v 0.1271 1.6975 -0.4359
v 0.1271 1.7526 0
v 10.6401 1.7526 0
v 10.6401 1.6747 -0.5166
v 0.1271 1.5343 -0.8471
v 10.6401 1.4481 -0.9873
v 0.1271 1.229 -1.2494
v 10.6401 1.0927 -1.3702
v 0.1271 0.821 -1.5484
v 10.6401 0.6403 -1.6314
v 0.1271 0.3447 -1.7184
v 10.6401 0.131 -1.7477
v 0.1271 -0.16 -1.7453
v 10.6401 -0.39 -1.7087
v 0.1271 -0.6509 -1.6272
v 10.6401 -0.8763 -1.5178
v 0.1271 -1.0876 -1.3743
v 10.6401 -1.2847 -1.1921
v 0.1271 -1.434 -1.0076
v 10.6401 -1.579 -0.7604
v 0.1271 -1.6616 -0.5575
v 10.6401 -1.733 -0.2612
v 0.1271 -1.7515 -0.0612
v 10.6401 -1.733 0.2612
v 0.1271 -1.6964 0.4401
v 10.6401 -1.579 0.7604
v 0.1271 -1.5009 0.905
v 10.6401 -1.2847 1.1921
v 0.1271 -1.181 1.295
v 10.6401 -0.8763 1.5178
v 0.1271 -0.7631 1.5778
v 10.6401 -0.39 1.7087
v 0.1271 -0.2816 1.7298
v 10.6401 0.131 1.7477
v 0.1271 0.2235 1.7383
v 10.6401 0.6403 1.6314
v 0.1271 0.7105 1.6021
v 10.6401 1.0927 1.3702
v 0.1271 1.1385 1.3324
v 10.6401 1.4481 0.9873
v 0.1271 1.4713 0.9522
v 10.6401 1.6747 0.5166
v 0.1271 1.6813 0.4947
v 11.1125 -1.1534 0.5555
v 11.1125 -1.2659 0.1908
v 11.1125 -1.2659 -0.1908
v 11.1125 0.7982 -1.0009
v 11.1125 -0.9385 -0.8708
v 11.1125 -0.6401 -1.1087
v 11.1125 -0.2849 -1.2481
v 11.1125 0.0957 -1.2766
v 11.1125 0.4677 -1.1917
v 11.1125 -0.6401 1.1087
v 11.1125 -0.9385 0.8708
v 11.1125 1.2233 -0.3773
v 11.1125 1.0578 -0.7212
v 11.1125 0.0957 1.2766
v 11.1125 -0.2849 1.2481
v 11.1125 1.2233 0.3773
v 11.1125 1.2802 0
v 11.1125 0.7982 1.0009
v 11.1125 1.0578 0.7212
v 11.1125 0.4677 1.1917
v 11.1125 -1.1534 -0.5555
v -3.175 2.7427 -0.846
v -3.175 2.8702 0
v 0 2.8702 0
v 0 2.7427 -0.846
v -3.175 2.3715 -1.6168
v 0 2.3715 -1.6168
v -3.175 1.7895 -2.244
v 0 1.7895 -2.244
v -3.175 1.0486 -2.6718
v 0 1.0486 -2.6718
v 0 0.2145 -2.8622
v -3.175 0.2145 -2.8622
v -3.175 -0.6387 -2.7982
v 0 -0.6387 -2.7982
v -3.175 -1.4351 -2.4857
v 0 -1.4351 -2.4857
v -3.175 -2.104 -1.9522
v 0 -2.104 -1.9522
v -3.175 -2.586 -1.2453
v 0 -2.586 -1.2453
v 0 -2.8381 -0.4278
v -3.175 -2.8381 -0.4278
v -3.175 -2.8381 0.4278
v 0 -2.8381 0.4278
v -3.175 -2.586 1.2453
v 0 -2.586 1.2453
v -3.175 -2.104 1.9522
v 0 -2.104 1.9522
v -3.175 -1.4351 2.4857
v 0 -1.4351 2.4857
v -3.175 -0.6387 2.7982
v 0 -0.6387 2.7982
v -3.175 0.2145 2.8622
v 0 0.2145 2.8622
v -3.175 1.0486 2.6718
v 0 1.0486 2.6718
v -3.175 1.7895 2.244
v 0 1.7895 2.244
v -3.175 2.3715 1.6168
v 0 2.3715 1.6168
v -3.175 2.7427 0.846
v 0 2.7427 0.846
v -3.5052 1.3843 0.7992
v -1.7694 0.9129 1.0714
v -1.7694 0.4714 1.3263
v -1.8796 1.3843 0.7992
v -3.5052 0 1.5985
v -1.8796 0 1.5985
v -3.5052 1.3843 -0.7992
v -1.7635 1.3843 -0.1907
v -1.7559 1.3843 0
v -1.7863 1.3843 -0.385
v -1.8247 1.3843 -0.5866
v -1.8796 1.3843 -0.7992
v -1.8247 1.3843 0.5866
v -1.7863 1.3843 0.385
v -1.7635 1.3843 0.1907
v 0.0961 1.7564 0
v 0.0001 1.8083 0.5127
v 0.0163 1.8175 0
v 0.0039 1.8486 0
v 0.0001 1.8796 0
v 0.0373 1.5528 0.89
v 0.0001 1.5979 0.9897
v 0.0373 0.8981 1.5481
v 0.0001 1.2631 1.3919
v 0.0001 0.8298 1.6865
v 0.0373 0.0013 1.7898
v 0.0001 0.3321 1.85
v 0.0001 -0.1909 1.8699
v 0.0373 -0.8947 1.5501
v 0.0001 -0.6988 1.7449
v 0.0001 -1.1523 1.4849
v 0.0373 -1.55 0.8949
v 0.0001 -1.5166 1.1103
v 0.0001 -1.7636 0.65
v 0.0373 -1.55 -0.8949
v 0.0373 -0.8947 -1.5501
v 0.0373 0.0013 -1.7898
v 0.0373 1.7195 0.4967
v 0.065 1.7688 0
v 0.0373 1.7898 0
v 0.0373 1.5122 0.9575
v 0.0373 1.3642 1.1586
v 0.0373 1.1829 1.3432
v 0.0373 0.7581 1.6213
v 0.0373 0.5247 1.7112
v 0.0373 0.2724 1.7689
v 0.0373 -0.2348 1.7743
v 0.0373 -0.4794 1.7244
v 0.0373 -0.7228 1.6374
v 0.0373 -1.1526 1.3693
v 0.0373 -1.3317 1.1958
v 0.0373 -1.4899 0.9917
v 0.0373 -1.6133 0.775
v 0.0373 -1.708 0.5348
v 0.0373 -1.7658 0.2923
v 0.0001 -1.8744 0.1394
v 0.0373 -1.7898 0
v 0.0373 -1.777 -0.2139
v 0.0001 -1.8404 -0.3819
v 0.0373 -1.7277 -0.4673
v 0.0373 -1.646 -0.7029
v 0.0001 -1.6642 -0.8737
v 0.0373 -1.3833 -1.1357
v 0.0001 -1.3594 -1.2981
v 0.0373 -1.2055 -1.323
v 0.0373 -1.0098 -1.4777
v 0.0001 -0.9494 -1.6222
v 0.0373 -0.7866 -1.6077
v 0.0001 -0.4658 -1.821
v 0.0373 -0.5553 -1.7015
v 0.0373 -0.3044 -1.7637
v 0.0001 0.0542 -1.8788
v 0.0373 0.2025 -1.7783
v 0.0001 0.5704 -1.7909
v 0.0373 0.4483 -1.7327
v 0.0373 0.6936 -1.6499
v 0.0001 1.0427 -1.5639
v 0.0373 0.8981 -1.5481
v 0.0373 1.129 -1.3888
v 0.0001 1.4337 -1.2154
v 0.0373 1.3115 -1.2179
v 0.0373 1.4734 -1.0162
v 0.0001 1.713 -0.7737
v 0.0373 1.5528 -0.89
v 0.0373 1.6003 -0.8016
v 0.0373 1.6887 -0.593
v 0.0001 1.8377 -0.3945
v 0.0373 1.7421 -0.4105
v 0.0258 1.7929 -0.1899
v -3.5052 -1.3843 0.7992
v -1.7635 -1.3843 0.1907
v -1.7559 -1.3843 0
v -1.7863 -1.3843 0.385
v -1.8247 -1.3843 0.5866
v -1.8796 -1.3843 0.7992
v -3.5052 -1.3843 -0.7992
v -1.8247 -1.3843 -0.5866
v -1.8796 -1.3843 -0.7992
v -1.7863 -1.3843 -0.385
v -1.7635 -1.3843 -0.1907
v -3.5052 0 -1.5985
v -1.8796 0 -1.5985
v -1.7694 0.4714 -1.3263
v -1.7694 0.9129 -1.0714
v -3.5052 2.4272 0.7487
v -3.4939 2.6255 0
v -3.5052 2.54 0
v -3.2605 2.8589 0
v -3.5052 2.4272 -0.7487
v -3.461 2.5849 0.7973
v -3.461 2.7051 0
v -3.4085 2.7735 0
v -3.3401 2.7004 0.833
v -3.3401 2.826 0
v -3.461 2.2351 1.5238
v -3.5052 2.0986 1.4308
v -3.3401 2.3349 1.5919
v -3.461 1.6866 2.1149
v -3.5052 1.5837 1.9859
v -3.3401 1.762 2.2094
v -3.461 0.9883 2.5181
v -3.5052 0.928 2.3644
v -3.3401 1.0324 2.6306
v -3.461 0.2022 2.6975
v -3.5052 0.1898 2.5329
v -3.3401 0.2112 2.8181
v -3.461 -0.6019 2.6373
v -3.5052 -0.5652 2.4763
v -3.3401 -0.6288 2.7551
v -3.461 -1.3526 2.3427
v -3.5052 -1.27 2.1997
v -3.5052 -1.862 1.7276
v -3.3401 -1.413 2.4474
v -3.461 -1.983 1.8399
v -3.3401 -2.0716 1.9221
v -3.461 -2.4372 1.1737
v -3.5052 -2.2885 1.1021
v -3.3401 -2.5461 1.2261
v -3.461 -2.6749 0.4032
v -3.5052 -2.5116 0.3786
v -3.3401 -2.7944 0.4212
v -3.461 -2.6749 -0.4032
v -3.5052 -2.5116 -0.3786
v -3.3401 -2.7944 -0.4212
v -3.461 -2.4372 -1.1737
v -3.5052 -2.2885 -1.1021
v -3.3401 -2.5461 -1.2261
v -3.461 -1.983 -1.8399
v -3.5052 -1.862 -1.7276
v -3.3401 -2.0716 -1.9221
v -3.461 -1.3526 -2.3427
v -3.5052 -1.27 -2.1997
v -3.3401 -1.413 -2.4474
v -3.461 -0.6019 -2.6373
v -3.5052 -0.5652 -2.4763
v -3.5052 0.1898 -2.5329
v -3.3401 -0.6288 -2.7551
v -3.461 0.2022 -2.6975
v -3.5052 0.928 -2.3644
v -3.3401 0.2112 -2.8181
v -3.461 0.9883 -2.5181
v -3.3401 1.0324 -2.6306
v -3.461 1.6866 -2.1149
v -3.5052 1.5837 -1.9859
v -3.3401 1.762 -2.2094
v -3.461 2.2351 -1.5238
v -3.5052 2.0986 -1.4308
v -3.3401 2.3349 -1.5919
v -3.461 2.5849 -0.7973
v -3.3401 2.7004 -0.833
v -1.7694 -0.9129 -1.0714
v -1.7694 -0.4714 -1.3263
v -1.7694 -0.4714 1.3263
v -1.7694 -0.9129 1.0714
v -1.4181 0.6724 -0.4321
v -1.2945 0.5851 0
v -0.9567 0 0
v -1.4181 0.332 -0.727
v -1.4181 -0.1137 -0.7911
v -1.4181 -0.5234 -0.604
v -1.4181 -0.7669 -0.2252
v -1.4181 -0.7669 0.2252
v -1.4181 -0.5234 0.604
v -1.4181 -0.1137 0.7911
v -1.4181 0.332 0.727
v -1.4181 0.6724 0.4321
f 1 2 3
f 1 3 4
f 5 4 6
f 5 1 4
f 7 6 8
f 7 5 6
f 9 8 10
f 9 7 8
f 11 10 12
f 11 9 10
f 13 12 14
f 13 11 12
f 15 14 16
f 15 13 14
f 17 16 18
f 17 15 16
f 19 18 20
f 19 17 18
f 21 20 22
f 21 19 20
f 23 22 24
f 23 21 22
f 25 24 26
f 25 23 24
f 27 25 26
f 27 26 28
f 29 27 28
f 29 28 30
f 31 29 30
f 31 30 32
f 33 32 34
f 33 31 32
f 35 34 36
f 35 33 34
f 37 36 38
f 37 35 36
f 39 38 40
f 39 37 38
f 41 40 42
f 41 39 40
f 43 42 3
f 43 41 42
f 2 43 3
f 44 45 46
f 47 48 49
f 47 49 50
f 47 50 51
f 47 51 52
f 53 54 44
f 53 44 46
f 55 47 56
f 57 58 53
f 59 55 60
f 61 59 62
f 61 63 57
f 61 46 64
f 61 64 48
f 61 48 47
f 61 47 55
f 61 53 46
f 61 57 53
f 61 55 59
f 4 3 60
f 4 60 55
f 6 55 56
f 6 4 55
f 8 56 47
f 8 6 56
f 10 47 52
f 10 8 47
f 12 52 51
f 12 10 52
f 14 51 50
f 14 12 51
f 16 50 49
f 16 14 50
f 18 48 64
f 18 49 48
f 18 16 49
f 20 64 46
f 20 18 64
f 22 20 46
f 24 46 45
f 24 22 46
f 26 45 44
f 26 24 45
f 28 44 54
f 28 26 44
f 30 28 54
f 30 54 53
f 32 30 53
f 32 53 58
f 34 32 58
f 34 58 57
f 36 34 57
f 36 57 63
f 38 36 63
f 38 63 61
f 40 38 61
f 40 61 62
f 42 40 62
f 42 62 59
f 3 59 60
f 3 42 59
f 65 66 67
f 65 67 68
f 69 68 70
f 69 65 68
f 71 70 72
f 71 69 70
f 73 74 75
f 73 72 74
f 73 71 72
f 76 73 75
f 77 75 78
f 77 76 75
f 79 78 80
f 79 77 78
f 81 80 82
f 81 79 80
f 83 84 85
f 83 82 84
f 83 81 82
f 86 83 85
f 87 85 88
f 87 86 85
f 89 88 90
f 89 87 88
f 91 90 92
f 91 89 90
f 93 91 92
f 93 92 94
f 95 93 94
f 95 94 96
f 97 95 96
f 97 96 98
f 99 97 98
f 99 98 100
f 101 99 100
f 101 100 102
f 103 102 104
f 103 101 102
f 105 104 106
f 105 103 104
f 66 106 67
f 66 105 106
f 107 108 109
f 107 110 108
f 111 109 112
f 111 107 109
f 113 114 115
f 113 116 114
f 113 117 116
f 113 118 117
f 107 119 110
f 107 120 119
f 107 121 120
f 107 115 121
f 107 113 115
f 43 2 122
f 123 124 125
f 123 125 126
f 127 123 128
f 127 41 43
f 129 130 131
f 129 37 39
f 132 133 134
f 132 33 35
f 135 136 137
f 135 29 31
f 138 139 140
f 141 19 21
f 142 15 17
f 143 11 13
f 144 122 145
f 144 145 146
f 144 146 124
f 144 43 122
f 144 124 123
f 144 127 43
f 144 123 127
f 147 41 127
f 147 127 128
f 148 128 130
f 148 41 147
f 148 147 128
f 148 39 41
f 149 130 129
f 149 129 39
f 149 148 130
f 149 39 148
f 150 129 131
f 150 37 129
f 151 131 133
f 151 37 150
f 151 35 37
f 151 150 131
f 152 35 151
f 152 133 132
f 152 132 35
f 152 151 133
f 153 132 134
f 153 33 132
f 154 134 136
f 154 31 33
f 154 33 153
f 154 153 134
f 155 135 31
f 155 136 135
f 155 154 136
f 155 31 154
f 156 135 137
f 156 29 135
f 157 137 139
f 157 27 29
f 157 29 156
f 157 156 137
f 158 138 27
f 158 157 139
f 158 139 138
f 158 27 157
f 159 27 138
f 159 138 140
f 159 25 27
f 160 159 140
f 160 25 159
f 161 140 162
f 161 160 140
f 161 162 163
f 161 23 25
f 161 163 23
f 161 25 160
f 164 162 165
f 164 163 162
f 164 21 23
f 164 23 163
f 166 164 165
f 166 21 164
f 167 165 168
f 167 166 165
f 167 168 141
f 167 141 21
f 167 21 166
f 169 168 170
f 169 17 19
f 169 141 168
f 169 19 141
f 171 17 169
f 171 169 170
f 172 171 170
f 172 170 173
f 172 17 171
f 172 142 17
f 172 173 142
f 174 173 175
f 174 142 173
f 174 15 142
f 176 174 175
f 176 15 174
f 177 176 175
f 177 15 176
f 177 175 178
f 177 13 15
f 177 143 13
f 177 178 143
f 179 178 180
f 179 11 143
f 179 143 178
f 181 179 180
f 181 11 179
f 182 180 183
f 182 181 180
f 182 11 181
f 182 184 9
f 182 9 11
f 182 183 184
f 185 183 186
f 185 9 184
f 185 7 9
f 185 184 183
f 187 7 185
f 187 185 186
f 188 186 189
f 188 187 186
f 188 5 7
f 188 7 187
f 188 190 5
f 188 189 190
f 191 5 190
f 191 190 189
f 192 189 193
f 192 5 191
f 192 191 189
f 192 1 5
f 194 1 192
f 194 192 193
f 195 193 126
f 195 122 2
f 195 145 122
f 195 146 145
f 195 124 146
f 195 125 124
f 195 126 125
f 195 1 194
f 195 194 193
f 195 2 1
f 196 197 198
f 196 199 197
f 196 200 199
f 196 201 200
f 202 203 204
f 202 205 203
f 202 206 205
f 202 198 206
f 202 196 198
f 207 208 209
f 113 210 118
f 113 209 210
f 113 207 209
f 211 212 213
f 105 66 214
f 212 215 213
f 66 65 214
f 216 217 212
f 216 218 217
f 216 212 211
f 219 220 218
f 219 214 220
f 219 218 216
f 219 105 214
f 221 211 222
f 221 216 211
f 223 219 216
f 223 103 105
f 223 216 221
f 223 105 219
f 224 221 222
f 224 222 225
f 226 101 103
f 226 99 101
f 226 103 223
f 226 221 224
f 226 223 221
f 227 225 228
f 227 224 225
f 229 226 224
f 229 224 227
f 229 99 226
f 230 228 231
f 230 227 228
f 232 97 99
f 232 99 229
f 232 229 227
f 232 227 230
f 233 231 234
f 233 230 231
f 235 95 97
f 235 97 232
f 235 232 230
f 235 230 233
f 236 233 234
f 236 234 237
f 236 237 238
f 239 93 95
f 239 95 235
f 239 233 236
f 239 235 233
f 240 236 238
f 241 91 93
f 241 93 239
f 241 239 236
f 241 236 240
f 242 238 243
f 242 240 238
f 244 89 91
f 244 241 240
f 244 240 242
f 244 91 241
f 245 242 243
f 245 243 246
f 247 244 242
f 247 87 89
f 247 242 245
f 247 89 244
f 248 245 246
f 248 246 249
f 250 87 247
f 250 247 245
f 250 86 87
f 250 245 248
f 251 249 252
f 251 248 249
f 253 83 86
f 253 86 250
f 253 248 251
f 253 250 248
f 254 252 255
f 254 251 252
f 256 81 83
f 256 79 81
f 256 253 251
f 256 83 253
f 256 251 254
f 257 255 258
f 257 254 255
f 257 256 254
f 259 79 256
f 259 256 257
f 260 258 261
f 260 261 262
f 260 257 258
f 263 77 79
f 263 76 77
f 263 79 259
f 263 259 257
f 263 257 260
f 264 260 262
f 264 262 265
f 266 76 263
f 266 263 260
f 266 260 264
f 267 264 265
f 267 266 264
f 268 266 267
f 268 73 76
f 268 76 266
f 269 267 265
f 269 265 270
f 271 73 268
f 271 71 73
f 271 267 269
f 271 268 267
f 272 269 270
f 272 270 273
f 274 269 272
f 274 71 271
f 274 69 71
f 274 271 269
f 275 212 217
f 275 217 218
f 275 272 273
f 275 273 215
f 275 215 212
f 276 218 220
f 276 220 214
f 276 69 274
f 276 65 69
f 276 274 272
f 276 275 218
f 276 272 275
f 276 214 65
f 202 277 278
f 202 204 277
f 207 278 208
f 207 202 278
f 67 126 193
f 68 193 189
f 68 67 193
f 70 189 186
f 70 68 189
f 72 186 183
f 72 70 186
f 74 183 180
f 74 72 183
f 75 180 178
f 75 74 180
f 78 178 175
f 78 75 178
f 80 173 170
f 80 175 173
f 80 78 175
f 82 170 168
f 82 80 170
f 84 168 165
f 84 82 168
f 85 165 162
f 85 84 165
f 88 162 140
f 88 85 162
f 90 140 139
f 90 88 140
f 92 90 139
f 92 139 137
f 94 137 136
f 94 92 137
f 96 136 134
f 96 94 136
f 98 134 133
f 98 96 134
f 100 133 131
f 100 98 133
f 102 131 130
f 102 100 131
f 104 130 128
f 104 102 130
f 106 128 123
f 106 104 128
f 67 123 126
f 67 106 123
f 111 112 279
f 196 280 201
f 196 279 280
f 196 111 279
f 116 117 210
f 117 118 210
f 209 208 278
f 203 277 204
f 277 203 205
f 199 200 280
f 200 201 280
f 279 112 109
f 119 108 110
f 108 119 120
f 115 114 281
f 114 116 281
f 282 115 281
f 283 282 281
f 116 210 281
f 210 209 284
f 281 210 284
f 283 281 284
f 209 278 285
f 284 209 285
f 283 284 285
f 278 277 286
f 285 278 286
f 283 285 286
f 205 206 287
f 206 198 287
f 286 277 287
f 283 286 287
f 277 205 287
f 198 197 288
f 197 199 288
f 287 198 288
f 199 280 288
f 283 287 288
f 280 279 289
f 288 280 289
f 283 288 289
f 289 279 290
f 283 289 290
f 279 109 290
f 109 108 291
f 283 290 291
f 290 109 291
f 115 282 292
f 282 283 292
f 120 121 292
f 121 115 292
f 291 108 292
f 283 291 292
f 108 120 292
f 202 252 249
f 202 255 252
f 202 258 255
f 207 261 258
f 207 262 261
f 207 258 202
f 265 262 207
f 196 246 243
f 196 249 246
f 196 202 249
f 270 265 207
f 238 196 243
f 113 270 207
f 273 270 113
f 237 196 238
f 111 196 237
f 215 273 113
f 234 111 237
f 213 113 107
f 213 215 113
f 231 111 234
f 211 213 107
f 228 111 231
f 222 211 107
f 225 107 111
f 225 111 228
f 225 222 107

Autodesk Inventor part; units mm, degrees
ref_plane "YZ Plane" through (0, 0, 0) normal (1, 0, 0) x (0, 1, 0)
ref_plane "XZ Plane" through (0, 0, 0) normal (0, 1, 0) x (-1, 0, 0)
sketch "Sketch1" plane through (0, 0, 0) normal (0, 0, 1) x (1, 0, 0)
  line L0 (-0.9567, 0) -> (11.1125, 0)
  line L1 (11.1125, 0) -> (11.1125, 1.7526)
  line L2 (11.1125, 1.7526) -> (1.9847, 1.7526)
  line L3 (1.9847, 1.7526) -> (0.0001, 1.7526)
  line L4 (0.0001, 1.7526) -> (0, 1.7526)
  line L5 (0, 1.7526) -> (0, 2.8702)
  line L6 (0, 2.8702) -> (-3.5052, 2.8702)
  line L7 (-3.5052, 2.8702) -> (-3.5052, 1.5985)
  line L8 (-3.5052, 1.5985) -> (-1.8796, 1.5985)
  line L9 (-1.8796, 1.5985) -> (-0.9567, 0)
  line L10 (-6.4287, 0) -> (14.036, 0) projected
  line L11 (0, -0.574) -> (0, 3.4442) projected
  line L12 (1.9847, 1.7526) -> (0, 1.7526) construction
  dimension "d1" = 9.1278
  dimension "d2" = 1.9846
  dimension "d3" = 3.5052
  dimension "d4" = 1.6256
  dimension "d5" = 60
  dimension "d6" = 3.5052
  dimension "d7" = 3.5052
  dimension "d8" = 3.1969
  dimension "d9" = 5.7404
  dimension "d26" = 11.1125
revolve "Body" add sketch "Sketch1" angle 360 about axis through (-0.9567, 0, 0) along (1, 0, 0)
sketch "Sketch2" plane through (-3.5052, 0, 0) normal (-1, 0, 0) x (0, 0, 1)
  circle A0 centre (0, 0) radius 1.5985 projected
  line L0 (0, -4.0183) -> (0, 4.0183) projected
  line L1 (-4.0183, 0) -> (4.0183, 0) projected
  line L2 (1.5985, 0) -> (0.7992, -1.3843)
  line L3 (0.7992, -1.3843) -> (-0.7992, -1.3843)
  line L4 (-0.7992, -1.3843) -> (-1.5985, 0)
  line L5 (-1.5985, 0) -> (-0.7992, 1.3843)
  line L6 (-0.7992, 1.3843) -> (0.7992, 1.3843)
  line L7 (0.7992, 1.3843) -> (1.5985, 0)
extrude "Slot" add sketch "Sketch2" against normal up to next contours L7 A0 | A0 L2 | L6 L0 A0 | A0 L0 L3 | L0 L6 A0 | A0 L3 L0 | L4 A0 | A0 L5
fillet "Fillet1" radius 0.3302 1 edges at (-3.5052, -2.8702, 0)
thread "Thread" size "6-32 UNC" class "2A" standard "ANSI Unified Screw Threads" length 9.1278
chamfer "Chamfer1" distance 0.4724 distance2 0.4724 1 edges at (11.1125, -1.7526, 0) measured on face at (11.1125, -0.5672, -0.1398)
ref_plane "Work Plane1" through (29, 0, 0) normal (0, -1, 0) x (1, 0, 0)
fillet "Fillet2" radius 0.127 1 edges at (0.0001, -1.7526, 0)
equation "\"d1\" = GEL"
equation "\"d3\" = KOH"
equation "\"d4\" = INTI"
equation "\"d6\" = GD"
equation "\"d7\" = BDM"
equation "\"d8\" = 1.1547 * SW"
equation "\"d9\" = KOD"
equation "\"d26\" = NLG"
equation "\"d30\" = R"
equation "\"d17\" = RR"
equation "\"d13\" = GEL"
equation "\"d15\" = -0.5 * SPD + 0.5 * GD"
equation "\"d16\" = GUL"
equation "\"GD\" = 3.5052"
equation "\"NLG\" = 11.1125"
equation "\"GEL\" = 9.1278"
equation "\"KOD\" = 5.7404"
equation "\"KOH\" = 3.5052"
equation "\"INTI\" = 1.6256"
equation "\"GAL\" = 1.9845"
equation "\"GUL\" = 0.47244"
equation "\"BDM\" = 3.5052"
equation "\"SW\" = 2.7686"
equation "\"RR\" = 0.3302"
equation "\"SPD\" = 2.56032"
equation "\"R\" = 0.127"
equation "\"PHH\" = 0.127"
equation "\"GD1\" = SPD"
equation "\"THREADDIA\" = 3.5052"
equation "\"FAWI\" = 45deg"
equation "\"KOH1\" = 3.1496"
equation "\"NND\" = 3.5052"
equation "\"TOA\" = 30deg"
equation "\"E0\" = 1.155 * SW"
properties part number "ANSI B18.3 - No. 6 - 32 UNC - 7/16 HS HCS" material "Steel, Mild"
